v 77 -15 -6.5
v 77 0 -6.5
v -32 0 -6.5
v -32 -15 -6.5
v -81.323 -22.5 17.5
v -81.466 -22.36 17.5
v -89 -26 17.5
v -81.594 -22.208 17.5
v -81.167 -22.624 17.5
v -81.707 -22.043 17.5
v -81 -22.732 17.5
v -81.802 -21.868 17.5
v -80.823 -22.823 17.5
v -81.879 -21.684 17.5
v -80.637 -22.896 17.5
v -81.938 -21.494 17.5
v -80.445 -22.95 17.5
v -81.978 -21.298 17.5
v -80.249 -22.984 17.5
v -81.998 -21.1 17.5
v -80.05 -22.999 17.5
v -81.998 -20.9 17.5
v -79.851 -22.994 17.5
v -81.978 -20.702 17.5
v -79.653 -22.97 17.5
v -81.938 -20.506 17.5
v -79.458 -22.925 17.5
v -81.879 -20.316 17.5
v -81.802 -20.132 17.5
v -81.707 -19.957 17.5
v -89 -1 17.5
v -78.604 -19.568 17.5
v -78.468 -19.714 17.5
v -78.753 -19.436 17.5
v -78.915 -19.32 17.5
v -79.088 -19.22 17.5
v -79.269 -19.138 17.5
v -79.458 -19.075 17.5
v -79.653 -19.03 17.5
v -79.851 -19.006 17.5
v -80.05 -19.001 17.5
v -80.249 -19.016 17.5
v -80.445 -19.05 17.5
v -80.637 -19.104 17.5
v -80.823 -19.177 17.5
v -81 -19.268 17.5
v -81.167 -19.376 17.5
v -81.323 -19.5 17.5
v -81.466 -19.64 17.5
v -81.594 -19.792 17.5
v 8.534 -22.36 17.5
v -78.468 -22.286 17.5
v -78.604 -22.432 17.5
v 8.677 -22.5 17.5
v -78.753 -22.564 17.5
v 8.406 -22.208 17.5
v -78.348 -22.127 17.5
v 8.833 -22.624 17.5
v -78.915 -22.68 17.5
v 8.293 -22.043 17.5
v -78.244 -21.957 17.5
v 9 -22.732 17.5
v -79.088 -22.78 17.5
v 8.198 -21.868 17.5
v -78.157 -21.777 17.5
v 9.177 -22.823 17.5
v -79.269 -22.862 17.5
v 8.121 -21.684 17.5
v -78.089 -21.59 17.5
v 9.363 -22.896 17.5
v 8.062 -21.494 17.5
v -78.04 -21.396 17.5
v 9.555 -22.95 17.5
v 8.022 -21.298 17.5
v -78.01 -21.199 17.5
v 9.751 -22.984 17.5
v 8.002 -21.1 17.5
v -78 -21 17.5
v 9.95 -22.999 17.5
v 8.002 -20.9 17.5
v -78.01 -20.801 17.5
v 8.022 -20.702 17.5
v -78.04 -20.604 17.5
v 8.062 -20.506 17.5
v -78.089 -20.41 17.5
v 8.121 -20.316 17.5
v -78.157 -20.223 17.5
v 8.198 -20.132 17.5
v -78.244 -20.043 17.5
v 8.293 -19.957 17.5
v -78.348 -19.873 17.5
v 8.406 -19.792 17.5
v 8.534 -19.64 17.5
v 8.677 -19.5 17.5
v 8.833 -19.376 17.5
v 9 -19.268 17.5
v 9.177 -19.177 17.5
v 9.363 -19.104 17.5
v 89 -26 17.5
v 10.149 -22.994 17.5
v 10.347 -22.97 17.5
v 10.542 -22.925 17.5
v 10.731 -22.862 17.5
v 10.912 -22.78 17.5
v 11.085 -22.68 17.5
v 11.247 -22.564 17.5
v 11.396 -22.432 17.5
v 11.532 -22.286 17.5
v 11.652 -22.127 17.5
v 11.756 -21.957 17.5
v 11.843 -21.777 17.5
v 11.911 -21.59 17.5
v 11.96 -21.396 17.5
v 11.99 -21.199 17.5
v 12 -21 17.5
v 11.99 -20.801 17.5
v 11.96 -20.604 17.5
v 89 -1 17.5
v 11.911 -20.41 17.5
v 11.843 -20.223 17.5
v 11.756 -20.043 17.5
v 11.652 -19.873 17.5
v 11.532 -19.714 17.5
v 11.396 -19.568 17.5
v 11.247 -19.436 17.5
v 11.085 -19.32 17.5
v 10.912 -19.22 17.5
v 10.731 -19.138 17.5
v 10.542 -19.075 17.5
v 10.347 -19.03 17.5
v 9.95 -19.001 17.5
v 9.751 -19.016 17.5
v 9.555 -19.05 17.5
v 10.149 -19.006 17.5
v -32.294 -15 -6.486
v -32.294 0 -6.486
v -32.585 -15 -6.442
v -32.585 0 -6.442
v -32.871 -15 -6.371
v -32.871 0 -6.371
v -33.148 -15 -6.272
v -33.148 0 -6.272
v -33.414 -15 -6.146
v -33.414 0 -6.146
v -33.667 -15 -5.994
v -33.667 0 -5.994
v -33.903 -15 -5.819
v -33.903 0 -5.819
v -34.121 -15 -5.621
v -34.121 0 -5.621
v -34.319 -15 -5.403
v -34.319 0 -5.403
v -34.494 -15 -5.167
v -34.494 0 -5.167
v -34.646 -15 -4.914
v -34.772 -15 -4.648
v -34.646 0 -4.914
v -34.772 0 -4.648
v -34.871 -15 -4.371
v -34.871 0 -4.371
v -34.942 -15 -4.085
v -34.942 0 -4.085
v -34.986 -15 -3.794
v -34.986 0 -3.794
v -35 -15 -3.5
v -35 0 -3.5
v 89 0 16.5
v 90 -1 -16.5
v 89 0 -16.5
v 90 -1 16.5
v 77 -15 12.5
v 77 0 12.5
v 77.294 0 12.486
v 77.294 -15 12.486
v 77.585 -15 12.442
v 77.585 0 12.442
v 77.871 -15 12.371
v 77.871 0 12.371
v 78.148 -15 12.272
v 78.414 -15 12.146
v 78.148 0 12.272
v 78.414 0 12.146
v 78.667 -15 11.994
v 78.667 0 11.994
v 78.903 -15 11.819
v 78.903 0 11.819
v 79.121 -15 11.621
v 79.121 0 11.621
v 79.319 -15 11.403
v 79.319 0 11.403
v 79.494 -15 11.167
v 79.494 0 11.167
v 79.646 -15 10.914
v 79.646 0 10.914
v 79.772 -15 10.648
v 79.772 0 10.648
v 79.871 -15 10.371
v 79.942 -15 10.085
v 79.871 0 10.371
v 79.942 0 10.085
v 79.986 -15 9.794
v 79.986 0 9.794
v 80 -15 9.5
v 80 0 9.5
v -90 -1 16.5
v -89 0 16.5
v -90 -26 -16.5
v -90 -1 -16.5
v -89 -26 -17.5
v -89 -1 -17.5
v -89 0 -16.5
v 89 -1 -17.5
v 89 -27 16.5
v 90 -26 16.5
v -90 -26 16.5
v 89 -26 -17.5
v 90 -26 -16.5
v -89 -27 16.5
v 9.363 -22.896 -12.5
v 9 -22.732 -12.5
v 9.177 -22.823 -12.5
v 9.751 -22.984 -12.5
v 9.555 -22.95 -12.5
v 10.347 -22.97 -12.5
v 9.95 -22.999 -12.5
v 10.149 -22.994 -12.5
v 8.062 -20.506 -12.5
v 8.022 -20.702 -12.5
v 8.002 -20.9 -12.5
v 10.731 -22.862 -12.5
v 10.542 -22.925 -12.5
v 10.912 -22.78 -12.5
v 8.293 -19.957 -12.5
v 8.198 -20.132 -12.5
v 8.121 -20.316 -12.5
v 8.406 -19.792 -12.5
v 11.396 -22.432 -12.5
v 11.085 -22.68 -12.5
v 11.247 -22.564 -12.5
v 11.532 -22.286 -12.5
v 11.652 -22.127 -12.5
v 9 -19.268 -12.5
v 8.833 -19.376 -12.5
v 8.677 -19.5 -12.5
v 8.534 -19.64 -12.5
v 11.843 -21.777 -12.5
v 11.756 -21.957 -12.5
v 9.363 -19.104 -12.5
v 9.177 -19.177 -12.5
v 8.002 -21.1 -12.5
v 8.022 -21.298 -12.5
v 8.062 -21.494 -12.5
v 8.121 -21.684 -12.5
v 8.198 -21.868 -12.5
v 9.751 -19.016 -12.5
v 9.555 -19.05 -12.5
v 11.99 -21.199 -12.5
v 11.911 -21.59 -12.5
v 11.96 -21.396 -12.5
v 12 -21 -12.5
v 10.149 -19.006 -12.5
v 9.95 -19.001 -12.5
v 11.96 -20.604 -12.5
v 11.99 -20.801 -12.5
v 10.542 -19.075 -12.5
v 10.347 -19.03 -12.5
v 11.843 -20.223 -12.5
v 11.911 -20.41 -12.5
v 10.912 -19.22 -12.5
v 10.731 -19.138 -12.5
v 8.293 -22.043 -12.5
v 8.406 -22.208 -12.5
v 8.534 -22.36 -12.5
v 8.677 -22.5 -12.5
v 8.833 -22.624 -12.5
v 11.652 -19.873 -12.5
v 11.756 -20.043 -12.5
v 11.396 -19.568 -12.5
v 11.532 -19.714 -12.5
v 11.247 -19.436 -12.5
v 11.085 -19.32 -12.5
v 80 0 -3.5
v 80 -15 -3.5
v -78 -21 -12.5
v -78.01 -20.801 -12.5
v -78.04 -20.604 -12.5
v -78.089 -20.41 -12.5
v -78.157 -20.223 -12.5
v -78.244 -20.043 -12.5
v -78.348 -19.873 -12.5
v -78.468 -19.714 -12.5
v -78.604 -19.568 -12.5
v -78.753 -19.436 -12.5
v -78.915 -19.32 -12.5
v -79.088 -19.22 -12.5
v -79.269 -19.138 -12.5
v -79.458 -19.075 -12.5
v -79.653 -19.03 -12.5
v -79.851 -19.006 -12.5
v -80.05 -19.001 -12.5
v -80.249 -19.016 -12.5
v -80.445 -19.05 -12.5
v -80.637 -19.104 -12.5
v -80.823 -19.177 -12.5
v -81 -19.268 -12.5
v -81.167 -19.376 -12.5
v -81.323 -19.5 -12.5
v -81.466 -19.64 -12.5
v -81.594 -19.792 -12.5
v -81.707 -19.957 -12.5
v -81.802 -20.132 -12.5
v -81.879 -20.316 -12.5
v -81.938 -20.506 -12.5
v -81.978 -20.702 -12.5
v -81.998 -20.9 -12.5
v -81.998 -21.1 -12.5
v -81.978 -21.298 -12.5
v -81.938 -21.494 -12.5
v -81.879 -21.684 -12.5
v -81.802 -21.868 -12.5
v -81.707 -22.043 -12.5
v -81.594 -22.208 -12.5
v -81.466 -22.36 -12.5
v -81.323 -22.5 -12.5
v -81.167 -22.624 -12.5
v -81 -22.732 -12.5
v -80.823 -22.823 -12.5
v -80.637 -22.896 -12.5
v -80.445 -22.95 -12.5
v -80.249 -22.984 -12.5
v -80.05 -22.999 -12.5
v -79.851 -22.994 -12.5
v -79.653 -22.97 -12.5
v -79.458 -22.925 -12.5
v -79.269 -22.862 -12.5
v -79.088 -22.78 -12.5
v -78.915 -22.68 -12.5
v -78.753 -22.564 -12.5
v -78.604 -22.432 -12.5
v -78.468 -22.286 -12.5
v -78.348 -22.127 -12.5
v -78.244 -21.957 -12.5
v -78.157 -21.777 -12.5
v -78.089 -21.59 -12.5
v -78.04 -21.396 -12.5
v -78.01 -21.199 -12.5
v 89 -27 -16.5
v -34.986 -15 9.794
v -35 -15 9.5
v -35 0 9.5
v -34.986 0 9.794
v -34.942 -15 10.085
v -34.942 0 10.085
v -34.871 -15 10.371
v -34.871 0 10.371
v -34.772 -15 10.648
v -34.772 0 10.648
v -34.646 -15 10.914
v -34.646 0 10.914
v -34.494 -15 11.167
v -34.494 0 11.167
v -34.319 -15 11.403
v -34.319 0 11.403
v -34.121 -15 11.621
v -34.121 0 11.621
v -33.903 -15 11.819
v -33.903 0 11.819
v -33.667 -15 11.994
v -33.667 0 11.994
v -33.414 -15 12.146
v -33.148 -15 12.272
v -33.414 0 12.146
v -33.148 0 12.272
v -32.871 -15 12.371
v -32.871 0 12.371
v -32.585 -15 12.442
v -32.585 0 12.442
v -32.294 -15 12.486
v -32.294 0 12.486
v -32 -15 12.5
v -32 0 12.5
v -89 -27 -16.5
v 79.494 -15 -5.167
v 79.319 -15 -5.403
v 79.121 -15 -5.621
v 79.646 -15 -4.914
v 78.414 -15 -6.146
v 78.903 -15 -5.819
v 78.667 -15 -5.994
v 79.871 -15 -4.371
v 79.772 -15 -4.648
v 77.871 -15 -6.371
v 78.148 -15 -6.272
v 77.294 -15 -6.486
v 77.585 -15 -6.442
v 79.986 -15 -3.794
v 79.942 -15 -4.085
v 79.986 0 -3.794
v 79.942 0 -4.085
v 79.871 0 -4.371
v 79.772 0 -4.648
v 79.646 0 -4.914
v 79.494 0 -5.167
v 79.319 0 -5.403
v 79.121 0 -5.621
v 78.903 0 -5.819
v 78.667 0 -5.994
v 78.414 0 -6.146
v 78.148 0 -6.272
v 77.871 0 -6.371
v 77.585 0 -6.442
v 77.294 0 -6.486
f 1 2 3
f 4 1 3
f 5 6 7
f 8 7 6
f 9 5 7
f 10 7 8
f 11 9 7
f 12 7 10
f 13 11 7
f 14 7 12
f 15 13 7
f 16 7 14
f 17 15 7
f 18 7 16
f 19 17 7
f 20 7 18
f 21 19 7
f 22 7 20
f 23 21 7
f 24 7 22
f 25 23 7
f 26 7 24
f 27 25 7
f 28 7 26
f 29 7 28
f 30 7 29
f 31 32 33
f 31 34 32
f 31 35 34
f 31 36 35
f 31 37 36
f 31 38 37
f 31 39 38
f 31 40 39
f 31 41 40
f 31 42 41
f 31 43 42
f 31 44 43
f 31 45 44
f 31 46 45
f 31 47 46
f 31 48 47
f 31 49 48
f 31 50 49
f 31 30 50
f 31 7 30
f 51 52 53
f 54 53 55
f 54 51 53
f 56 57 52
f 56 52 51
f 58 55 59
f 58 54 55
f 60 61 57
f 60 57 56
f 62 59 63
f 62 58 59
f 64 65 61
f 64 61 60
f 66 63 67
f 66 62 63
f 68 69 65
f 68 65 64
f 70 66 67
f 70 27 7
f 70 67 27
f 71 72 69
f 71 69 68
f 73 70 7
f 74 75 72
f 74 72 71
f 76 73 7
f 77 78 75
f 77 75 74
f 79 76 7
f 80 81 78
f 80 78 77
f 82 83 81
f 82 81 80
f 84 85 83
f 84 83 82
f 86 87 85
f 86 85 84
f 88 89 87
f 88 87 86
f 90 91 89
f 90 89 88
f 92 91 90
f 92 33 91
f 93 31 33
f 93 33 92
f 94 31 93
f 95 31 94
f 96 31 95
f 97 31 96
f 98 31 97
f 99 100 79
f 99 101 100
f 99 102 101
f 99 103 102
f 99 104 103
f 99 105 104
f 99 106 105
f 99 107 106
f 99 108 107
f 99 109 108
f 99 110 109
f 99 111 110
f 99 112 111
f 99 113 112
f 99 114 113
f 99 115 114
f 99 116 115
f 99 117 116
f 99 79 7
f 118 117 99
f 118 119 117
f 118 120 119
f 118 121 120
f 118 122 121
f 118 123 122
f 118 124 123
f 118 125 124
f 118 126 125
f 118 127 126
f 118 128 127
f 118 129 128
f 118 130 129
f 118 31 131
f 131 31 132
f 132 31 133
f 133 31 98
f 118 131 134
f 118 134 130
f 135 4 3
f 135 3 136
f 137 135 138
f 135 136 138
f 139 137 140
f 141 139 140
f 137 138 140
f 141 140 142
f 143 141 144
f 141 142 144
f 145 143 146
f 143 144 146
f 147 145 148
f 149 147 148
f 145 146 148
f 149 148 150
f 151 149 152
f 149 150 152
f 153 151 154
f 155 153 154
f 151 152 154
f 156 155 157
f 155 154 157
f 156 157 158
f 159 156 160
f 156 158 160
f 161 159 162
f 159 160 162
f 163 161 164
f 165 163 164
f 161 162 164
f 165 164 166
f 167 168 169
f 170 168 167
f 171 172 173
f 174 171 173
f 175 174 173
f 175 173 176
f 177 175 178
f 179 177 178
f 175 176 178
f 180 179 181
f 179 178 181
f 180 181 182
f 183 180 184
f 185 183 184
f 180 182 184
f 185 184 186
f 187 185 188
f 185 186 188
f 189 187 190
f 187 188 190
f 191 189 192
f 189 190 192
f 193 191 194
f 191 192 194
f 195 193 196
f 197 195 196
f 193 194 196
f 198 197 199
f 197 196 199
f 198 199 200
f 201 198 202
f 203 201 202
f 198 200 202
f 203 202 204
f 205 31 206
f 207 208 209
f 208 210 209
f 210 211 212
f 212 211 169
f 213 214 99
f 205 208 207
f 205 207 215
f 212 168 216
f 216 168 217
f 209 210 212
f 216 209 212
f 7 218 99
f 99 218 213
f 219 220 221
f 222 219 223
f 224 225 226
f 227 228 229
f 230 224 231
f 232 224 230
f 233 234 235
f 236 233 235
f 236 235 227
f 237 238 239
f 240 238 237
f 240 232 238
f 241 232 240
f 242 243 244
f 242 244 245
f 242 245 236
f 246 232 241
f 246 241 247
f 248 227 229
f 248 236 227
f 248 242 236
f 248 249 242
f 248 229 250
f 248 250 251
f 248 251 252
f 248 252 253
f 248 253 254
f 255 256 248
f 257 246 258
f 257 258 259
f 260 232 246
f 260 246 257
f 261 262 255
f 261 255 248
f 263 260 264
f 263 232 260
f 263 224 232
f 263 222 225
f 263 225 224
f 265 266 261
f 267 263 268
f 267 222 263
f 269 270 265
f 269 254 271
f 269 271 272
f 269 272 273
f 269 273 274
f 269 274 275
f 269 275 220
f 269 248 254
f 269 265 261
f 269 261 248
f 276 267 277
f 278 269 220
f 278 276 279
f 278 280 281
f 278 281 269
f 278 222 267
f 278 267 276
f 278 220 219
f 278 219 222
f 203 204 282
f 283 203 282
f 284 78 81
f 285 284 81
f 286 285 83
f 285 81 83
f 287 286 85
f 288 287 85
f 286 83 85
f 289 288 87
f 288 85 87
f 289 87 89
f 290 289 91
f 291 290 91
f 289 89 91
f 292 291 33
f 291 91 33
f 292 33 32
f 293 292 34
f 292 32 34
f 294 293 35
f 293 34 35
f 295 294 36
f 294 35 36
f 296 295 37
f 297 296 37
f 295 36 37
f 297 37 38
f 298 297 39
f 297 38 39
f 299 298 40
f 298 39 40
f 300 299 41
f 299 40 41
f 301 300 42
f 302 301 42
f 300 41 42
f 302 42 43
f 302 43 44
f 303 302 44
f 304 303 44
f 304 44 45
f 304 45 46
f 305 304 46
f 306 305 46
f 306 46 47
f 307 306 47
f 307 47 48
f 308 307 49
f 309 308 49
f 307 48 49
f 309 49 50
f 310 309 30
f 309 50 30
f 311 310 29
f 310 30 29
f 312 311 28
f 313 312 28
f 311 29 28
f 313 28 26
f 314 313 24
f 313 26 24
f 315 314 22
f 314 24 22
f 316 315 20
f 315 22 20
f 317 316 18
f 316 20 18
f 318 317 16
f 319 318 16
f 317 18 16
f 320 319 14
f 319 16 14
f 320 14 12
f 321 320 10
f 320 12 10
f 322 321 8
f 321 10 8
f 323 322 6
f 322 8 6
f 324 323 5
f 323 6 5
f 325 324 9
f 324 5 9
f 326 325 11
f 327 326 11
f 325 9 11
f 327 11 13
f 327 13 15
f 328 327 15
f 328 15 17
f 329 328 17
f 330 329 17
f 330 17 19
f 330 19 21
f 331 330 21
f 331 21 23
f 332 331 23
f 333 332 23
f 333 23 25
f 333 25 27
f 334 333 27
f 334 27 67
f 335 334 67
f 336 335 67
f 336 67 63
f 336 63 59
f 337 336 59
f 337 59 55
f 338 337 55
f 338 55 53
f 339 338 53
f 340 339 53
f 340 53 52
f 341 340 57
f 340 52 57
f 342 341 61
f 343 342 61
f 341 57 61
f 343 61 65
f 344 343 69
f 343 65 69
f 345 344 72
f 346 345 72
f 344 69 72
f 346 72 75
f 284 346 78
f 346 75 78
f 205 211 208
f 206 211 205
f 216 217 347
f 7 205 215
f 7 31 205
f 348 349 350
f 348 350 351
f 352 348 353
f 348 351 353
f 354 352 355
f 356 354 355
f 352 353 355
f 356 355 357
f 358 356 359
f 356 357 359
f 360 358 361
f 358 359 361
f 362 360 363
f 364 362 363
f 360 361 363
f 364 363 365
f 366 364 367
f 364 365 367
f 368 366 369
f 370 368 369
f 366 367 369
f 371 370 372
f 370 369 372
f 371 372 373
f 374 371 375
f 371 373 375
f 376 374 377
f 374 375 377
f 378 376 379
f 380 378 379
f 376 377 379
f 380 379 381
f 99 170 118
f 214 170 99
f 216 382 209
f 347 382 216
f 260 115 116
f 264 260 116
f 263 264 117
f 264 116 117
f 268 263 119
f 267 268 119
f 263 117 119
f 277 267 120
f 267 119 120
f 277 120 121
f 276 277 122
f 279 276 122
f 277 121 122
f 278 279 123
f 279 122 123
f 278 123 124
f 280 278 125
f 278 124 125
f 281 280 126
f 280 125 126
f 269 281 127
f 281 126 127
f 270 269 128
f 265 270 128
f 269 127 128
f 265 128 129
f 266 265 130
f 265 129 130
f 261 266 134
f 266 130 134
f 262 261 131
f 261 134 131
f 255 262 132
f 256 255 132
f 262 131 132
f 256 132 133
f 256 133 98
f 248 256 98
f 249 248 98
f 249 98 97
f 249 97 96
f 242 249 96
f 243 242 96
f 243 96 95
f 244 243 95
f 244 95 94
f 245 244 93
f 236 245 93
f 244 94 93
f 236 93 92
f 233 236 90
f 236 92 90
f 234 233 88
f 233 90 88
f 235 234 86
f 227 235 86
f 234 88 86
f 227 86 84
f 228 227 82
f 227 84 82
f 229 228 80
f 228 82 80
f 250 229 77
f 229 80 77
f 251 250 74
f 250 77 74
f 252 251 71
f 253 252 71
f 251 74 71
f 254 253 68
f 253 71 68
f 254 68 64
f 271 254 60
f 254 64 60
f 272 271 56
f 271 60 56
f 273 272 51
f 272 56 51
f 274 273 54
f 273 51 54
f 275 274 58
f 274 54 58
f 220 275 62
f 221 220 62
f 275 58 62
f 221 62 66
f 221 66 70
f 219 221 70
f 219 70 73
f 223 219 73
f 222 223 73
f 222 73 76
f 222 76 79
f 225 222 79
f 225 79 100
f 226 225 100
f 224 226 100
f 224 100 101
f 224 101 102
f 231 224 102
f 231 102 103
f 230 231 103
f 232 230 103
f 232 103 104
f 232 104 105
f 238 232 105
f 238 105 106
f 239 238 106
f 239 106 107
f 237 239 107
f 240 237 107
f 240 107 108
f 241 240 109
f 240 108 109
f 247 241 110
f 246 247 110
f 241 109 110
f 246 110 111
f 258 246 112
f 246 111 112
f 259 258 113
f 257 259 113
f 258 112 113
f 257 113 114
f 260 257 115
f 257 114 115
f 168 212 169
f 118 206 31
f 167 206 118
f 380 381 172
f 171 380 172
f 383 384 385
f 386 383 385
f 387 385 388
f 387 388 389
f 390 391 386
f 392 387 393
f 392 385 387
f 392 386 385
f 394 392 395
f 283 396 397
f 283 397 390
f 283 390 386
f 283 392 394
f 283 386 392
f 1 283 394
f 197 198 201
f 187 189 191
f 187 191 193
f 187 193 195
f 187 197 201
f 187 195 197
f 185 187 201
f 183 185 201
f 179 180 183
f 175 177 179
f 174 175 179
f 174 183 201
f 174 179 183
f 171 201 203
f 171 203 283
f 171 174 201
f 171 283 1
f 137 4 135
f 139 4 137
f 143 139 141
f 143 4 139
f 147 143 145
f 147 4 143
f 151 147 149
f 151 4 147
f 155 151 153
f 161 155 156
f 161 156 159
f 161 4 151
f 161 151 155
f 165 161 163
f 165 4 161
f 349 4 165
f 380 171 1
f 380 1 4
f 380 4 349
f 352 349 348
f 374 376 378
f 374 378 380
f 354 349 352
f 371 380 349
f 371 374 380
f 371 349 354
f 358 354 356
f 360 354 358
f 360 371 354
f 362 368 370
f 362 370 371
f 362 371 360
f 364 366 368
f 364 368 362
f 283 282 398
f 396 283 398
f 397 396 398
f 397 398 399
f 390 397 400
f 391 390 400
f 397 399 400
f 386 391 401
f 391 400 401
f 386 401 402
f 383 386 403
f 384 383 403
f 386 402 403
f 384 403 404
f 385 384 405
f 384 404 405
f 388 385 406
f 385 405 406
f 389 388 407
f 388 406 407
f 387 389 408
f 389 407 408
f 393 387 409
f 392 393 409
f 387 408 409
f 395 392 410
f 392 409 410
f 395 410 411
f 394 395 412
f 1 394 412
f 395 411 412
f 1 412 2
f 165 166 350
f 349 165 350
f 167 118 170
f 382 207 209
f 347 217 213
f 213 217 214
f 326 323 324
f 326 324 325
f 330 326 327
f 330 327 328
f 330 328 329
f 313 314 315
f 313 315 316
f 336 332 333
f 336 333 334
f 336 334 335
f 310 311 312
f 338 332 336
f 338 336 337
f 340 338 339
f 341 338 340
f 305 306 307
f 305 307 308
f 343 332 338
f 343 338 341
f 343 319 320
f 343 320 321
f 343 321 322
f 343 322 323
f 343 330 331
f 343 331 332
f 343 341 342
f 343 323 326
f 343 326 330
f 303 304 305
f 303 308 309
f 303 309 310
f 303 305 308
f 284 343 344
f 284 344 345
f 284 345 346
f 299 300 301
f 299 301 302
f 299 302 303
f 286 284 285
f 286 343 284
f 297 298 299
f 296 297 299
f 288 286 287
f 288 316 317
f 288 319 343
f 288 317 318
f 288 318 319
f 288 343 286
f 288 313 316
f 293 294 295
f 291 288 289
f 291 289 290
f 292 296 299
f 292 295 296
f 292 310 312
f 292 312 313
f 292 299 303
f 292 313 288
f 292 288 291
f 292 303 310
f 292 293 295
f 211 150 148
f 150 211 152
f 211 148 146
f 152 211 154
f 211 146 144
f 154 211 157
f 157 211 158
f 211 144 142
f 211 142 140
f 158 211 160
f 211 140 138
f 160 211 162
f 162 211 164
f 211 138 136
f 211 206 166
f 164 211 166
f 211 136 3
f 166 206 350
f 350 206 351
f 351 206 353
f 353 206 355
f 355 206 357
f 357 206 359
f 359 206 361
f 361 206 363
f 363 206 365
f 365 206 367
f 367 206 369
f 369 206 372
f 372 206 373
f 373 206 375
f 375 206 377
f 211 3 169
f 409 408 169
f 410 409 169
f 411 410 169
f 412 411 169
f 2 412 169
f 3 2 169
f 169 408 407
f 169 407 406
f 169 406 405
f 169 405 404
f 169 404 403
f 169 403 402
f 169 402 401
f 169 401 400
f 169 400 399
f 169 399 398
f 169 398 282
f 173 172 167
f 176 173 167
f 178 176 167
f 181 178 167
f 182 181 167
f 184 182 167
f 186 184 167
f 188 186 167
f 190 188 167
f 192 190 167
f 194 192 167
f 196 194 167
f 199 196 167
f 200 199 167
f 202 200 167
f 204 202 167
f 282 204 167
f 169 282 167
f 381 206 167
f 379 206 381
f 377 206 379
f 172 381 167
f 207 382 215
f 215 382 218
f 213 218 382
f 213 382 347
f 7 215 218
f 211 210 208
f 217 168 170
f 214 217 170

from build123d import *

# Parameters (mm, degrees)
F0_W     = 180
F0_H     = 35
F1_DEPTH = 27
F3_DEPTH = 15
F4_SIZE  = 1
F5_R     = 2
F6_DEPTH = 30


with BuildPart() as f1:
    # F0 (on Front) → F1 (new body)
    with BuildSketch(Plane.XZ):
        Rectangle(F0_W, F0_H)
    extrude(amount=F1_DEPTH)

    # F2 (on face) → F3 (cut)
    with BuildSketch(Plane(origin=(0, 0, 0), x_dir=(-1, 0, 0), z_dir=(0, 1, 0))):
        with BuildLine():
            Line((32, 12.5), (-77, 12.5))
            ThreePointArc((-77, 12.5), (-79.12132, 11.62132), (-80, 9.5))
            Line((-80, 9.5), (-80, -3.5))
            ThreePointArc((-80, -3.5), (-79.12132, -5.62132), (-77, -6.5))
            Line((-77, -6.5), (32, -6.5))
            ThreePointArc((32, -6.5), (34.12132, -5.62132), (35, -3.5))
            Line((35, -3.5), (35, 9.5))
            ThreePointArc((35, 9.5), (34.12132, 11.62132), (32, 12.5))
        make_face()
    extrude(amount=-F3_DEPTH, mode=Mode.SUBTRACT)

    # F4
    f4_edges = [f1.edges().sort_by_distance(p)[0] for p in [
        (-90, -13.5, -17.5),
        (-90, -13.5, 17.5),
        (90, -13.5, -17.5),
        (90, -13.5, 17.5),
        (0, 0, 17.5),
        (0, 0, -17.5),
        (90, -27, 0),
        (90, 0, 0),
        (-90, 0, 0),
        (-90, -27, 0),
        (0, -27, -17.5),
        (0, -27, 17.5),
    ]]
    chamfer(f4_edges, length=F4_SIZE)

    # F5 (on face) → F6 (cut)
    with BuildSketch(Plane.XY.offset(17.5)):
        with Locations((-80, -21)):
            Circle(F5_R)
        with Locations((10, -21)):
            Circle(F5_R)
    extrude(amount=-F6_DEPTH, mode=Mode.SUBTRACT)


solid = f1.part
